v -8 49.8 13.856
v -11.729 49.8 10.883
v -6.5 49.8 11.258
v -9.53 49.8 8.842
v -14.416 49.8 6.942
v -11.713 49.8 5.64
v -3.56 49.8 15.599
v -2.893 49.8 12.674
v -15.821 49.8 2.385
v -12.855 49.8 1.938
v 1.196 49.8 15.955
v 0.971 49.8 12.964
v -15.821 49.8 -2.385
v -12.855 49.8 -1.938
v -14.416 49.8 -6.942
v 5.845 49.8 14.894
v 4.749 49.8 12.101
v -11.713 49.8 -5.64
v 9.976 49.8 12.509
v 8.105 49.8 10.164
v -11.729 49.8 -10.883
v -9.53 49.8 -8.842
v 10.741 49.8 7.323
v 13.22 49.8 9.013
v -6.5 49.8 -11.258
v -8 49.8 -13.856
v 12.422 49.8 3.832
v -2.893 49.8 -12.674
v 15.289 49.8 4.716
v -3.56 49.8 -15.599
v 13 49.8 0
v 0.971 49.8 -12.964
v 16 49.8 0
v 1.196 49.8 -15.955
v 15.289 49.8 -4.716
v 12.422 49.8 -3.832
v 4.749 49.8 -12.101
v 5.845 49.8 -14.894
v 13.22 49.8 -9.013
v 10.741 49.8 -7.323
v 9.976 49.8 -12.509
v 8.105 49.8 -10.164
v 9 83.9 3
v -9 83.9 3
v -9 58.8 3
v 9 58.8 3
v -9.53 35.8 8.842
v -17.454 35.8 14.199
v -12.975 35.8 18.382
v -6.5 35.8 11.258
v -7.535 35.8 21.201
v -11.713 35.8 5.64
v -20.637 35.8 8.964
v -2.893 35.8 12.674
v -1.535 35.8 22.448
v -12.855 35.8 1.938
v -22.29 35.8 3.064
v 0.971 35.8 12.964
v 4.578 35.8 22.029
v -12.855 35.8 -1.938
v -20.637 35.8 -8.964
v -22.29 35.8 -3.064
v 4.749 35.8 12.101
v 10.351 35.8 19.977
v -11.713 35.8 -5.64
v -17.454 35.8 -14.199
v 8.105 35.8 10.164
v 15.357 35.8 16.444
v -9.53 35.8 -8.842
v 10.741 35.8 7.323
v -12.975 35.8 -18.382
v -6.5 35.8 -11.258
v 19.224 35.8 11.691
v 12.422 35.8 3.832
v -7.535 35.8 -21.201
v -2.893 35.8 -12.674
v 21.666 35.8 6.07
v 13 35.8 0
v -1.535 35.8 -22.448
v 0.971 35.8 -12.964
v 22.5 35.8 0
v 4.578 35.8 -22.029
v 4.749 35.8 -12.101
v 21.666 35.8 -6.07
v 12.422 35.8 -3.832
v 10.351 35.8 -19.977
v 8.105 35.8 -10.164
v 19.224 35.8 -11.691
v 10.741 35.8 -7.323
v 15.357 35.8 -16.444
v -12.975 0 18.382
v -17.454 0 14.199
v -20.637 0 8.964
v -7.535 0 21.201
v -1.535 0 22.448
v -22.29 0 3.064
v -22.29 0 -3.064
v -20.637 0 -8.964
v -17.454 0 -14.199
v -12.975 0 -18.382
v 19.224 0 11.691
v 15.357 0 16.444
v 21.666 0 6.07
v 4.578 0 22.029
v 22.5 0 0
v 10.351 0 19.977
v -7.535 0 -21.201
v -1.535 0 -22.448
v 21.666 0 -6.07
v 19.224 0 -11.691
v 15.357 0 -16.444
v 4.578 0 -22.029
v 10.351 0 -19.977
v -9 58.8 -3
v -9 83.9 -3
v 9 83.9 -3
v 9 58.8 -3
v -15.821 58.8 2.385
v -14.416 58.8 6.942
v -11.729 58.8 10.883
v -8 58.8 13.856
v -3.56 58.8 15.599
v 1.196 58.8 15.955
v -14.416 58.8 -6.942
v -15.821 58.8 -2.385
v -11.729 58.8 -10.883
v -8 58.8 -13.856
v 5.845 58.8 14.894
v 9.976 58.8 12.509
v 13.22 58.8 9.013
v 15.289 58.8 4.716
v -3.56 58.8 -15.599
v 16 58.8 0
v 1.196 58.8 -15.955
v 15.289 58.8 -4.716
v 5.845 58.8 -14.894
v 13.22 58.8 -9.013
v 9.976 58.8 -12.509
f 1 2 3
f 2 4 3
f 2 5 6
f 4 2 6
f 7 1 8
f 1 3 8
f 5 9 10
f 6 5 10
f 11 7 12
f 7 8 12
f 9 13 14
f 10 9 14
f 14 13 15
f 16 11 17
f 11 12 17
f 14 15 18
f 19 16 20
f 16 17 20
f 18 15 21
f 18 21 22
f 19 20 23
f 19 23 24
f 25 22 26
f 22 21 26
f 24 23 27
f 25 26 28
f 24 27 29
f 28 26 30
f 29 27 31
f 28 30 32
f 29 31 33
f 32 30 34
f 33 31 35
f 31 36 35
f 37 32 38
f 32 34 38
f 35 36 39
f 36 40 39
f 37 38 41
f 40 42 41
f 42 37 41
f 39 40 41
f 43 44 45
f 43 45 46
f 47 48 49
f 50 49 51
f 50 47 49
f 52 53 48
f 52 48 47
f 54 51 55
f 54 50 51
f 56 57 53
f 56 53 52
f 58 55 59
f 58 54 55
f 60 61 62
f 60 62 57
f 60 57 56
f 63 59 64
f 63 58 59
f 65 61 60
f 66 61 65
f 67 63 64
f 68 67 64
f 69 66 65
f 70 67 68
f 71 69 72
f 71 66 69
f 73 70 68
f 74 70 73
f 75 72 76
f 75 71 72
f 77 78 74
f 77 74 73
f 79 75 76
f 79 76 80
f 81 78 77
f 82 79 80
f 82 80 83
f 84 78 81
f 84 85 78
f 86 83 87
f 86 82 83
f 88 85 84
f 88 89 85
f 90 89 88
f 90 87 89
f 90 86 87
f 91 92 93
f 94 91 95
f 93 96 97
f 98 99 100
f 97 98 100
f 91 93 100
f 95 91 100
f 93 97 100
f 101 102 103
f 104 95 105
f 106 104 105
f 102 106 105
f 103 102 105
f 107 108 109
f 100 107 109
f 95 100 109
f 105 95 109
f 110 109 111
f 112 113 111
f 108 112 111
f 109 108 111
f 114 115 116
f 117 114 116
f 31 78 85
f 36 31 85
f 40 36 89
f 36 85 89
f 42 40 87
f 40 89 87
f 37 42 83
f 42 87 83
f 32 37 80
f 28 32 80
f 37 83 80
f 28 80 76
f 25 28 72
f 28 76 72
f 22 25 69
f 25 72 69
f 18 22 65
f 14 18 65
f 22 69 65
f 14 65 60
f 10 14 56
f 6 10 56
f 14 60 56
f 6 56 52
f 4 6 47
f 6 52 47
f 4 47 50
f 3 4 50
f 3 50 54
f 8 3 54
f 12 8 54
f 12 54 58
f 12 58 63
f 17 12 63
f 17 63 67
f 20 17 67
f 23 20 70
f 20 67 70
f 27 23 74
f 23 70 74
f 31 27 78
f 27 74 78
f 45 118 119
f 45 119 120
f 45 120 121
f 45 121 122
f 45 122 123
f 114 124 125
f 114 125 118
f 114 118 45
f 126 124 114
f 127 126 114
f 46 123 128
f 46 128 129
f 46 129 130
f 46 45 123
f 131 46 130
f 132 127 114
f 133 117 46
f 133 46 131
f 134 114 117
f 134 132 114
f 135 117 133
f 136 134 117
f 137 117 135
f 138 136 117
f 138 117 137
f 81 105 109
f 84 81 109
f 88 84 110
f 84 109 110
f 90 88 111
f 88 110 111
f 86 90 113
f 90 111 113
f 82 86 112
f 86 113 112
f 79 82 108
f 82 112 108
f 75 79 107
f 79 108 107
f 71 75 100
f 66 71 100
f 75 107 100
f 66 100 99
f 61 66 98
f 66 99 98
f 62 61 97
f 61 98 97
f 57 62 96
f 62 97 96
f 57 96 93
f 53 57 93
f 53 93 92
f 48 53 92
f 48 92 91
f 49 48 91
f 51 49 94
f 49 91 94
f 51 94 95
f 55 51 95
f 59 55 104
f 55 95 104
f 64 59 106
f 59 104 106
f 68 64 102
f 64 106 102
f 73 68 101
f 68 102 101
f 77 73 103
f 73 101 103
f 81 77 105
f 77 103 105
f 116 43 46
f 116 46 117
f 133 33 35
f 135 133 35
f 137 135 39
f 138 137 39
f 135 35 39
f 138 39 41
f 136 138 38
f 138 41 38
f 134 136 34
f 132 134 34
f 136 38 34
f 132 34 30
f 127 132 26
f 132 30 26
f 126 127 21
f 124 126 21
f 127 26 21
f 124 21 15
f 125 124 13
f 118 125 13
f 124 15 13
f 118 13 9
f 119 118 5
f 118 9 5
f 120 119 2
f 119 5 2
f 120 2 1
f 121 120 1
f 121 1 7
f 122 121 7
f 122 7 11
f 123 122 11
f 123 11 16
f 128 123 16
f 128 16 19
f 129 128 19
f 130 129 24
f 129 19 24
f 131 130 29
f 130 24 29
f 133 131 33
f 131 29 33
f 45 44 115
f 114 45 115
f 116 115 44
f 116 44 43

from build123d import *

# Parameters (mm, degrees)
SCHIZZO1_R                   = 22.5
ESTRUSIONE_ESTRUSIONE1_DEPTH = 35.8
SCHIZZO2_R                   = 13
ESTRUSIONE_ESTRUSIONE3_DEPTH = 14
SCHIZZO3_R                   = 16
ESTRUSIONE_ESTRUSIONE4_DEPTH = 9
SCHIZZO4_W                   = 18
SCHIZZO4_H                   = 6
ESTRUSIONE_ESTRUSIONE5_DEPTH = 25.1


with BuildPart() as part:
    # Schizzo1 → Estrusione-Estrusione1 (new body)
    with BuildSketch(Plane(origin=(0, 0, 0), x_dir=(1, 0, 0), z_dir=(0, 1, 0))):
        Circle(SCHIZZO1_R)
    extrude(amount=ESTRUSIONE_ESTRUSIONE1_DEPTH)

    # Schizzo2 → Estrusione-Estrusione3 (add)
    with BuildSketch(Plane(origin=(0, 35.8, 0), x_dir=(1, 0, 0), z_dir=(0, 1, 0))):
        Circle(SCHIZZO2_R)
    extrude(amount=ESTRUSIONE_ESTRUSIONE3_DEPTH)

    # Schizzo3 → Estrusione-Estrusione4 (add)
    with BuildSketch(Plane(origin=(0, 49.8, 0), x_dir=(1, 0, 0), z_dir=(0, 1, 0))):
        Circle(SCHIZZO3_R)
    extrude(amount=ESTRUSIONE_ESTRUSIONE4_DEPTH)

    # Schizzo4 → Estrusione-Estrusione5 (add)
    with BuildSketch(Plane(origin=(0, 58.8, 0), x_dir=(1, 0, 0), z_dir=(0, 1, 0))):
        Rectangle(SCHIZZO4_W, SCHIZZO4_H)
    extrude(amount=ESTRUSIONE_ESTRUSIONE5_DEPTH)


solid = part.part
